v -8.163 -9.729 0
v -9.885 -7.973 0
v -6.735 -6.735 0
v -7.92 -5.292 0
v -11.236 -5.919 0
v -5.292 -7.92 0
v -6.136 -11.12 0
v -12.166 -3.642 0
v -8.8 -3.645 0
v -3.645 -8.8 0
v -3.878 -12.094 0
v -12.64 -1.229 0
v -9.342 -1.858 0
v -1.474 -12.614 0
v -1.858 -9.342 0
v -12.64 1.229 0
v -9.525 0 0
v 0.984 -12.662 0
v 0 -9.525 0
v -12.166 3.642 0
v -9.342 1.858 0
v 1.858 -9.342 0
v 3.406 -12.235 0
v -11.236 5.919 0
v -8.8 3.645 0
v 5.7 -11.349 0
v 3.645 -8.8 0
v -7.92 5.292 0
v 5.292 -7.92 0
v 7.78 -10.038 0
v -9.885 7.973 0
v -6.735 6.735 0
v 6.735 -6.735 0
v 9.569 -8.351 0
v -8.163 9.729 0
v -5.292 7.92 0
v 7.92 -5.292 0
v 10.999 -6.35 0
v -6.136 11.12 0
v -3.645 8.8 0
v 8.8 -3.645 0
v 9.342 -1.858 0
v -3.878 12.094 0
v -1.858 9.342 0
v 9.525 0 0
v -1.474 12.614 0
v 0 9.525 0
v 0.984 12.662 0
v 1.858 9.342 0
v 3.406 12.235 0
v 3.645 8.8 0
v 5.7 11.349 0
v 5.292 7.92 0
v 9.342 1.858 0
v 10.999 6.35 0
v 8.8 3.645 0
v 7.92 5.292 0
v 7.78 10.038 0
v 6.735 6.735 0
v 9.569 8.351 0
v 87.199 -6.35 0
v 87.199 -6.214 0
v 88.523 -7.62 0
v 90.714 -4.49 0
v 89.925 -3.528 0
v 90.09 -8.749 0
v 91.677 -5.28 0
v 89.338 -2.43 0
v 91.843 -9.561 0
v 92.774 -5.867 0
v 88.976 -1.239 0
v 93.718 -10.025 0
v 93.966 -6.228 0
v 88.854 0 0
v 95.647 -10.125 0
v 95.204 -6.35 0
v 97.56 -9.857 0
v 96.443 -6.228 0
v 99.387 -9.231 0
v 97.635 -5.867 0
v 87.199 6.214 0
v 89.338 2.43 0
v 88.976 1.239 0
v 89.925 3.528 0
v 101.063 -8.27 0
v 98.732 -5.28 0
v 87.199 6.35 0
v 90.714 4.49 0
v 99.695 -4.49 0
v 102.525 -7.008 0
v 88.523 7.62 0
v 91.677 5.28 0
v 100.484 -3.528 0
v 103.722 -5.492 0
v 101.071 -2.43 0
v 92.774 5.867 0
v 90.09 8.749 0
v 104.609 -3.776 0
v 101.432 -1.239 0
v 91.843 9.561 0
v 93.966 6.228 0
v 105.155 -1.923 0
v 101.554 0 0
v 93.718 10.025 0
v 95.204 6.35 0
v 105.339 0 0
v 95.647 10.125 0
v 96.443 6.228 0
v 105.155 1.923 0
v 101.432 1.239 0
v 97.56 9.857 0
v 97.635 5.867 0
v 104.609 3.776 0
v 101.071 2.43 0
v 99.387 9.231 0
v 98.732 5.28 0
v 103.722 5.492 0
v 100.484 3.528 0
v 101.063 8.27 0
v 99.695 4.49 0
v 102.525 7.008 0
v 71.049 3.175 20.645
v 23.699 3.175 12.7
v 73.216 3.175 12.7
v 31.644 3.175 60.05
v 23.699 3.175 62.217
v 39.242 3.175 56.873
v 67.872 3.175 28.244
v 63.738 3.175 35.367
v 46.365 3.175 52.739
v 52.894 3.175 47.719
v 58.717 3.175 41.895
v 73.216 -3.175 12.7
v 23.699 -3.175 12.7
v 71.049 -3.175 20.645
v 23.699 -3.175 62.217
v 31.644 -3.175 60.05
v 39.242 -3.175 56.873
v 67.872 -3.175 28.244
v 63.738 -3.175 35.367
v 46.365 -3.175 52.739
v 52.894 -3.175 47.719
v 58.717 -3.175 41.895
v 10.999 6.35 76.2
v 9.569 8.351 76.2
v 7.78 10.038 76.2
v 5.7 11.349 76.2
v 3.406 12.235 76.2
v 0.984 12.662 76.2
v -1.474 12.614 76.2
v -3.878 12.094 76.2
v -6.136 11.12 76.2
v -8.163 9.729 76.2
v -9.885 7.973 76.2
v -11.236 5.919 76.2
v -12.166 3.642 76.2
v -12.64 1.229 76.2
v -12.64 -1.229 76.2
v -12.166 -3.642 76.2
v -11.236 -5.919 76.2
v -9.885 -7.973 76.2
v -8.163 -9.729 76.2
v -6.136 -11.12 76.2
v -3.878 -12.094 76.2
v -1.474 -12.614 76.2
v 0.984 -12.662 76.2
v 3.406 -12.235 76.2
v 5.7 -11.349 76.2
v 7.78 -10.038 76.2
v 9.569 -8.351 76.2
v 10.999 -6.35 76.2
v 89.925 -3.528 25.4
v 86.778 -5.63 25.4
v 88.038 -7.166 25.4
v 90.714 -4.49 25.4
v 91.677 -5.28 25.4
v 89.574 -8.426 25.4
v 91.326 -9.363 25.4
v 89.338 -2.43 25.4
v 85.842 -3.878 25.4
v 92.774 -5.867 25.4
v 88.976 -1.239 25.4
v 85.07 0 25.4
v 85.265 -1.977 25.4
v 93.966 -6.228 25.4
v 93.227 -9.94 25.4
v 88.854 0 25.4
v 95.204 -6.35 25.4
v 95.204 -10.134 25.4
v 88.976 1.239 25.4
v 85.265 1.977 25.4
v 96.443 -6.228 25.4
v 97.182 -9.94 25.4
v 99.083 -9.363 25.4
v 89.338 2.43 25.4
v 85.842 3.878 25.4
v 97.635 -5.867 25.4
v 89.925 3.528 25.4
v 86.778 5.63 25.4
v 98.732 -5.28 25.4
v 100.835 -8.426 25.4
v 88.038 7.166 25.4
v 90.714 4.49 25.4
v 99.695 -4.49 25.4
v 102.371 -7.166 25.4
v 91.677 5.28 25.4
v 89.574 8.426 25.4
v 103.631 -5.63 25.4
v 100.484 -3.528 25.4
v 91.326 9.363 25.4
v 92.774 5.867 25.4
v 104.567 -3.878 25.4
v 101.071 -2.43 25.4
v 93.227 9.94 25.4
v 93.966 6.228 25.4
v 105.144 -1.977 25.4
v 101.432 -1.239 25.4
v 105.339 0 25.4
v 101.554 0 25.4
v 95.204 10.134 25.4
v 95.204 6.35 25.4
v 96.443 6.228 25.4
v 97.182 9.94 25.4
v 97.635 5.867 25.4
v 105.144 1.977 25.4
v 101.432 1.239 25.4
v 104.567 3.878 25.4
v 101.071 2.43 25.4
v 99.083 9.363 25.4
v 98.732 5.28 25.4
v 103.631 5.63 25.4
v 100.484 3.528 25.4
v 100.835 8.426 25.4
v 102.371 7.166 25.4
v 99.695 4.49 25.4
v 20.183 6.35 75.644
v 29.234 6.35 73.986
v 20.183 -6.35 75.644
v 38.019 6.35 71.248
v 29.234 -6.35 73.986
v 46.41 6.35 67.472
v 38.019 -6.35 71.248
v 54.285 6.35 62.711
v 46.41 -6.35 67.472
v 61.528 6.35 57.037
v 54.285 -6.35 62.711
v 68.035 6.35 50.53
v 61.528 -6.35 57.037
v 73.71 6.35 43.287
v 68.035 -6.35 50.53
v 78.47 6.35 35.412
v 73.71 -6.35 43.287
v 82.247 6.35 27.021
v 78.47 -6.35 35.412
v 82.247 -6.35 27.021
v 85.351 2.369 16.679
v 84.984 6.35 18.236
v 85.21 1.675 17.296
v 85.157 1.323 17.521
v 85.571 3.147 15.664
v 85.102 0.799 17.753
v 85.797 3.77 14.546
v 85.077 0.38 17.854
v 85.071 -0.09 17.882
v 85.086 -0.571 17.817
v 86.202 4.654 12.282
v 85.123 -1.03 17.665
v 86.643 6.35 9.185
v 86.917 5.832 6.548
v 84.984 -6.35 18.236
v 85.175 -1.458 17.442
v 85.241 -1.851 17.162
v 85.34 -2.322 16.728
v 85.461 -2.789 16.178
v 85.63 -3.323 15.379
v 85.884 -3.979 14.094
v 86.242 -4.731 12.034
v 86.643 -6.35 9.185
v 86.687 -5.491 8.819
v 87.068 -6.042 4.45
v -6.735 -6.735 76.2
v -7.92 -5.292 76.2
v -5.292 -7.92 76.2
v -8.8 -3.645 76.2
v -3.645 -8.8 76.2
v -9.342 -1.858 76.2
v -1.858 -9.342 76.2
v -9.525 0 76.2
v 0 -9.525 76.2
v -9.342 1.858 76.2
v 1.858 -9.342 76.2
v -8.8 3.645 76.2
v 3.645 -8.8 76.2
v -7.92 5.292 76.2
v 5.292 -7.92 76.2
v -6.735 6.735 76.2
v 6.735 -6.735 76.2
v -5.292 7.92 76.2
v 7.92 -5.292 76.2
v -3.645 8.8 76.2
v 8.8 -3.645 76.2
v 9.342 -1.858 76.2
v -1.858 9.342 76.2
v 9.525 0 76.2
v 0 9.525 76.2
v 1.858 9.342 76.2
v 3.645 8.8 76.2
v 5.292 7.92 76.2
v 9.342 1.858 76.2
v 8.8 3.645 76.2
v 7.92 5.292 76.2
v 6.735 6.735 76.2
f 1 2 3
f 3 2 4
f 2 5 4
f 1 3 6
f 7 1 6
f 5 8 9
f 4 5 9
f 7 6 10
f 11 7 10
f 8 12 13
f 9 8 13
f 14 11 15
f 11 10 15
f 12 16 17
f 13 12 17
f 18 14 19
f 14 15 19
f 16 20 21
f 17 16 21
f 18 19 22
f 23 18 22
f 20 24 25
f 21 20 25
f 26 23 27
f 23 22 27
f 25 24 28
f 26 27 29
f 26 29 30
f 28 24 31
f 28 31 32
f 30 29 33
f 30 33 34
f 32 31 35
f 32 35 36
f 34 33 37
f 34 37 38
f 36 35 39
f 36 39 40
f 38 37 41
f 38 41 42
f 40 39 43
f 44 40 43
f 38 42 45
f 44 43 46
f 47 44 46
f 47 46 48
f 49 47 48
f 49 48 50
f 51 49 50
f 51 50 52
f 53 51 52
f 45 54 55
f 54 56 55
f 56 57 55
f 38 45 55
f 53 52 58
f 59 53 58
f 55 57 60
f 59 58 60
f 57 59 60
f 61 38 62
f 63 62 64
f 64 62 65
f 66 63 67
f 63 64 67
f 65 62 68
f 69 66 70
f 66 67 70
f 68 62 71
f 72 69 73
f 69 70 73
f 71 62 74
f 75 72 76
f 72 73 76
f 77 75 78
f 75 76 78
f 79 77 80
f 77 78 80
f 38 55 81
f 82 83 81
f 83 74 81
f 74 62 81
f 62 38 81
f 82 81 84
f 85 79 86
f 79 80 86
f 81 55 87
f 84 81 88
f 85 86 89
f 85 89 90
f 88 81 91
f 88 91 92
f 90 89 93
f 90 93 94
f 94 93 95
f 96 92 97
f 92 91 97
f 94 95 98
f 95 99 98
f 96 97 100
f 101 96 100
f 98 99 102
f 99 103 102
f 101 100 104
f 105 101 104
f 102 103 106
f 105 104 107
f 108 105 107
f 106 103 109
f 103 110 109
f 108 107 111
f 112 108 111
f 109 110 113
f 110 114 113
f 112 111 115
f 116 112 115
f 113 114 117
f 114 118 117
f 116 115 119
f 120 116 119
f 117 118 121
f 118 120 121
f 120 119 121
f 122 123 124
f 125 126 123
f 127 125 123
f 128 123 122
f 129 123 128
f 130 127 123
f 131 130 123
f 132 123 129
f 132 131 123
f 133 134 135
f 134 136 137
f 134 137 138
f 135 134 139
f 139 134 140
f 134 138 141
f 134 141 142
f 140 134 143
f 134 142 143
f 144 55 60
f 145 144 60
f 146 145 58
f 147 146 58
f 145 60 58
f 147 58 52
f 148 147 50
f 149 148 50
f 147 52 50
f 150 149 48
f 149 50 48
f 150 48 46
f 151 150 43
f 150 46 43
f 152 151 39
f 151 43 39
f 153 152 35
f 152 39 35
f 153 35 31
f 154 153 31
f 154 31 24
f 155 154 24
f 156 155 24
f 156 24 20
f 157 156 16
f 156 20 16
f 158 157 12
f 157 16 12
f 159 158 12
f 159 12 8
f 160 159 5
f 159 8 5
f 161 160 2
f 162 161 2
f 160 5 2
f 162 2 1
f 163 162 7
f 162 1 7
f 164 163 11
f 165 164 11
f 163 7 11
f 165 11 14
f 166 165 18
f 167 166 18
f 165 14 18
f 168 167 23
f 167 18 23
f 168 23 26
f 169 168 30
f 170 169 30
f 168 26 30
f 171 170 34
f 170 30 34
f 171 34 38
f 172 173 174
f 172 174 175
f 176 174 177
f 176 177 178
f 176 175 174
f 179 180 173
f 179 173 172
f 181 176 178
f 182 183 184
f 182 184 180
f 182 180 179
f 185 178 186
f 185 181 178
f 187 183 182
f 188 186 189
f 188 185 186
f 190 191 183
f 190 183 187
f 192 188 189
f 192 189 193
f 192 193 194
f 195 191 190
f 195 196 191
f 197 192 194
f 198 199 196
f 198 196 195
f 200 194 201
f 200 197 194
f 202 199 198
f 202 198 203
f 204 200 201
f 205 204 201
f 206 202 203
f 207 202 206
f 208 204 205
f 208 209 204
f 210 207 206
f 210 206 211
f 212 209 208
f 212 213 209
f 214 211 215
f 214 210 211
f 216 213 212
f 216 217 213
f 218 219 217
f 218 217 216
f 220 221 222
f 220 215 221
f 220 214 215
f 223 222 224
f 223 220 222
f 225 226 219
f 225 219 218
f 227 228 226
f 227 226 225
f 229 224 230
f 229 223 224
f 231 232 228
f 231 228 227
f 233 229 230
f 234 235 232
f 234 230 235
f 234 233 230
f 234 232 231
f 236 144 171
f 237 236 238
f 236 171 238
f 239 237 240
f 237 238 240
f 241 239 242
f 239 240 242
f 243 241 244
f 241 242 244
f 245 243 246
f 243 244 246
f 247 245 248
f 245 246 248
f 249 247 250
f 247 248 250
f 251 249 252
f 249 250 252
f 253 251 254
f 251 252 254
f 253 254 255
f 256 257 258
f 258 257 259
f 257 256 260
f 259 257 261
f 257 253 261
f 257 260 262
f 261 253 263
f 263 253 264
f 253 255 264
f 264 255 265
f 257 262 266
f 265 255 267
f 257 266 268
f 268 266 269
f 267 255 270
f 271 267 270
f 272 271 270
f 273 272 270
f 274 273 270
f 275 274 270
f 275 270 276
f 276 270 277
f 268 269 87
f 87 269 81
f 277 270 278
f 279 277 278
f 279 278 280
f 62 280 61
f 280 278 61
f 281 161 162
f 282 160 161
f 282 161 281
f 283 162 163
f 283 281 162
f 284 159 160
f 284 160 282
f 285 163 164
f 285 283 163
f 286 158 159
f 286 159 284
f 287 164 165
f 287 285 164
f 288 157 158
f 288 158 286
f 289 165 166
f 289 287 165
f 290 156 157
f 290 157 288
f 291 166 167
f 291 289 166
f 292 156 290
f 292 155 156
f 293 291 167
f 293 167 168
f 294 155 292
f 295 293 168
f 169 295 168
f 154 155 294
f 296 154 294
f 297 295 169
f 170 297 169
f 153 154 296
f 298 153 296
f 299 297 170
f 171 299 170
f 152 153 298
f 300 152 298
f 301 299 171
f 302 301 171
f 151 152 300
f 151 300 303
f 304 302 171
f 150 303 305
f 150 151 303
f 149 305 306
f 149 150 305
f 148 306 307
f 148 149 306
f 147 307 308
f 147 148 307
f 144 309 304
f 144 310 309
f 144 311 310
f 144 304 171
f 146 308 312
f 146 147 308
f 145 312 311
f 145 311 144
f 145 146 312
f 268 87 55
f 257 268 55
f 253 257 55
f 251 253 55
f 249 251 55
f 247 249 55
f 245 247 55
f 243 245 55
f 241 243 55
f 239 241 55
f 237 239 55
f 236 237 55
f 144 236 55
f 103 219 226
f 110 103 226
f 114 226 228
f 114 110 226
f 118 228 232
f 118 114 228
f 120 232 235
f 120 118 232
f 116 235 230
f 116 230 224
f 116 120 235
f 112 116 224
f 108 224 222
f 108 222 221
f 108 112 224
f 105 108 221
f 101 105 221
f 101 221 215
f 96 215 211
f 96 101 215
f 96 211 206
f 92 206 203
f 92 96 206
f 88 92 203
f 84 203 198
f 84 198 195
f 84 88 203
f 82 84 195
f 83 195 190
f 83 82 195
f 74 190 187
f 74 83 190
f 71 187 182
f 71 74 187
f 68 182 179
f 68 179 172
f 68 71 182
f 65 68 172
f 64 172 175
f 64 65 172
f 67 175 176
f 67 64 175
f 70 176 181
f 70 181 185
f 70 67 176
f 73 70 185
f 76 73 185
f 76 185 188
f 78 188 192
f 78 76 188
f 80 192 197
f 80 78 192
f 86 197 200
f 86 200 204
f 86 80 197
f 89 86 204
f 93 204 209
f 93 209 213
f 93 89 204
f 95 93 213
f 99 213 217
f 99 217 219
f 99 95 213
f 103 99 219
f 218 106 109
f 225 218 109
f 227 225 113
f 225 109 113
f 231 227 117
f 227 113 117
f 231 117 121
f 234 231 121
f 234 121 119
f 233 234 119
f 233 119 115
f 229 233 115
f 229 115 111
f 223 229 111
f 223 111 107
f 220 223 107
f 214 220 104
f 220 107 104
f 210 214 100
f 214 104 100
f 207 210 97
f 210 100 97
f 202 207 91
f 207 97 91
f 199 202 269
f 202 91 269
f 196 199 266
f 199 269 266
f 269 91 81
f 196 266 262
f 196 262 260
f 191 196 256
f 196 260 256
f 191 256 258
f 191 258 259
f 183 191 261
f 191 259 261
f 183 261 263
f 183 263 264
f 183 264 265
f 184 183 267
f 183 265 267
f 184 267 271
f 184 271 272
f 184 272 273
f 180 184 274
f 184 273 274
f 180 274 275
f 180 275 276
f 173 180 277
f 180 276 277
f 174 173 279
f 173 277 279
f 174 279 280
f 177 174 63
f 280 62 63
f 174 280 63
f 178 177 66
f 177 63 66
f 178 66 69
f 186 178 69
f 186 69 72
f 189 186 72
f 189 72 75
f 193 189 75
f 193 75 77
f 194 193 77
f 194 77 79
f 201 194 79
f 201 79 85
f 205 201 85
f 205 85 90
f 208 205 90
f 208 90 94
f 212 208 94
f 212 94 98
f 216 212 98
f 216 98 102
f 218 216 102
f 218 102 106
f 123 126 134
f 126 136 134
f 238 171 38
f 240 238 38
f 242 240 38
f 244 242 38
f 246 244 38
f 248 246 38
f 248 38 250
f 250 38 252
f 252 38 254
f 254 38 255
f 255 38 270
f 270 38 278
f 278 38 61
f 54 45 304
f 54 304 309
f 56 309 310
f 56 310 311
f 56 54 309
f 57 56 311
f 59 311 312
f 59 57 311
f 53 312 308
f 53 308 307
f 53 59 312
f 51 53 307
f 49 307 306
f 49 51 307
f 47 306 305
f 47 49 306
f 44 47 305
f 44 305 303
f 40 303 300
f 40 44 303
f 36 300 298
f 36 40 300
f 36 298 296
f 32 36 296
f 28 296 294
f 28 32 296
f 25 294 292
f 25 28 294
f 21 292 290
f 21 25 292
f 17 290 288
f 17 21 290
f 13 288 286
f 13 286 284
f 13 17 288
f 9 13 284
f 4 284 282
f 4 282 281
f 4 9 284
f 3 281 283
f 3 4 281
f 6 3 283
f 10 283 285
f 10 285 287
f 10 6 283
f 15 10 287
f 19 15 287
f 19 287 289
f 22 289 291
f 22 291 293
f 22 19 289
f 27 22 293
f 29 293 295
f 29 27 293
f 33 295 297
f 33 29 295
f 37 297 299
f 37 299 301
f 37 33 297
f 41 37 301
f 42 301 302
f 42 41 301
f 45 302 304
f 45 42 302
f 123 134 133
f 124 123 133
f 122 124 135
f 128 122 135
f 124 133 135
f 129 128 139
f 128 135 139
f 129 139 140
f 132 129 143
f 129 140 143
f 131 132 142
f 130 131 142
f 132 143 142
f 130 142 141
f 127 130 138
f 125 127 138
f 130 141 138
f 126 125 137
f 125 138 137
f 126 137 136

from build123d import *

# Parameters (mm, degrees)
F0_R     = 9.525
F1_DEPTH = 76.2
F3_DEPTH = 19.051
F4_R     = 10.1343674416
F4_R_2   = 6.35
F5_DEPTH = 25.4
F7_DEPTH = 3.175


with BuildPart() as f1:
    # F0 (on Top) → F1 (new body)
    with BuildSketch(Plane.XY):
        with BuildLine():
            Line((87.1985226281, 6.35), (10.9985226281, 6.35))
            ThreePointArc((10.9985226281, 6.35), (-12.7, 0), (10.9985226281, -6.35))
            Line((10.9985226281, -6.35), (87.1985226281, -6.35))
            Line((87.1985226281, -6.35), (87.1985226281, 6.35))
        make_face()
        Circle(F0_R, mode=Mode.SUBTRACT)
    extrude(amount=F1_DEPTH)

    # F2 (on face) → F3 (cut, through all)
    with BuildSketch(Plane.XZ.offset(6.35)):
        with BuildLine():
            ThreePointArc((10.9985226281, 76.2), (64.8800593545, 53.8815367264), (87.1985226281, 0))
            Line((87.1985226281, 0), (87.1985226281, 76.2))
            Line((87.1985226281, 76.2), (10.9985226281, 76.2))
        make_face()
    extrude(amount=-F3_DEPTH, mode=Mode.SUBTRACT)

    # F4 (on Top) → F5 (join)
    with BuildSketch(Plane.XY):
        with Locations((95.2044725418, 0)):
            Circle(F4_R)
        with Locations((95.2044725418, 0)):
            Circle(F4_R_2, mode=Mode.SUBTRACT)
    extrude(amount=F5_DEPTH)

    # F6 (on Front) → F7 (cut, symmetric)
    with BuildSketch(Plane.XZ):
        with BuildLine():
            Line((23.6985226281, 62.2170394667), (23.6985226281, 12.7))
            Line((23.6985226281, 12.7), (73.2155620948, 12.7))
            ThreePointArc((73.2155620948, 12.7), (55.8998032334, 44.9012806053), (23.6985226281, 62.2170394667))
        make_face()
    extrude(amount=F7_DEPTH, both=True, mode=Mode.SUBTRACT)


solid = f1.part
